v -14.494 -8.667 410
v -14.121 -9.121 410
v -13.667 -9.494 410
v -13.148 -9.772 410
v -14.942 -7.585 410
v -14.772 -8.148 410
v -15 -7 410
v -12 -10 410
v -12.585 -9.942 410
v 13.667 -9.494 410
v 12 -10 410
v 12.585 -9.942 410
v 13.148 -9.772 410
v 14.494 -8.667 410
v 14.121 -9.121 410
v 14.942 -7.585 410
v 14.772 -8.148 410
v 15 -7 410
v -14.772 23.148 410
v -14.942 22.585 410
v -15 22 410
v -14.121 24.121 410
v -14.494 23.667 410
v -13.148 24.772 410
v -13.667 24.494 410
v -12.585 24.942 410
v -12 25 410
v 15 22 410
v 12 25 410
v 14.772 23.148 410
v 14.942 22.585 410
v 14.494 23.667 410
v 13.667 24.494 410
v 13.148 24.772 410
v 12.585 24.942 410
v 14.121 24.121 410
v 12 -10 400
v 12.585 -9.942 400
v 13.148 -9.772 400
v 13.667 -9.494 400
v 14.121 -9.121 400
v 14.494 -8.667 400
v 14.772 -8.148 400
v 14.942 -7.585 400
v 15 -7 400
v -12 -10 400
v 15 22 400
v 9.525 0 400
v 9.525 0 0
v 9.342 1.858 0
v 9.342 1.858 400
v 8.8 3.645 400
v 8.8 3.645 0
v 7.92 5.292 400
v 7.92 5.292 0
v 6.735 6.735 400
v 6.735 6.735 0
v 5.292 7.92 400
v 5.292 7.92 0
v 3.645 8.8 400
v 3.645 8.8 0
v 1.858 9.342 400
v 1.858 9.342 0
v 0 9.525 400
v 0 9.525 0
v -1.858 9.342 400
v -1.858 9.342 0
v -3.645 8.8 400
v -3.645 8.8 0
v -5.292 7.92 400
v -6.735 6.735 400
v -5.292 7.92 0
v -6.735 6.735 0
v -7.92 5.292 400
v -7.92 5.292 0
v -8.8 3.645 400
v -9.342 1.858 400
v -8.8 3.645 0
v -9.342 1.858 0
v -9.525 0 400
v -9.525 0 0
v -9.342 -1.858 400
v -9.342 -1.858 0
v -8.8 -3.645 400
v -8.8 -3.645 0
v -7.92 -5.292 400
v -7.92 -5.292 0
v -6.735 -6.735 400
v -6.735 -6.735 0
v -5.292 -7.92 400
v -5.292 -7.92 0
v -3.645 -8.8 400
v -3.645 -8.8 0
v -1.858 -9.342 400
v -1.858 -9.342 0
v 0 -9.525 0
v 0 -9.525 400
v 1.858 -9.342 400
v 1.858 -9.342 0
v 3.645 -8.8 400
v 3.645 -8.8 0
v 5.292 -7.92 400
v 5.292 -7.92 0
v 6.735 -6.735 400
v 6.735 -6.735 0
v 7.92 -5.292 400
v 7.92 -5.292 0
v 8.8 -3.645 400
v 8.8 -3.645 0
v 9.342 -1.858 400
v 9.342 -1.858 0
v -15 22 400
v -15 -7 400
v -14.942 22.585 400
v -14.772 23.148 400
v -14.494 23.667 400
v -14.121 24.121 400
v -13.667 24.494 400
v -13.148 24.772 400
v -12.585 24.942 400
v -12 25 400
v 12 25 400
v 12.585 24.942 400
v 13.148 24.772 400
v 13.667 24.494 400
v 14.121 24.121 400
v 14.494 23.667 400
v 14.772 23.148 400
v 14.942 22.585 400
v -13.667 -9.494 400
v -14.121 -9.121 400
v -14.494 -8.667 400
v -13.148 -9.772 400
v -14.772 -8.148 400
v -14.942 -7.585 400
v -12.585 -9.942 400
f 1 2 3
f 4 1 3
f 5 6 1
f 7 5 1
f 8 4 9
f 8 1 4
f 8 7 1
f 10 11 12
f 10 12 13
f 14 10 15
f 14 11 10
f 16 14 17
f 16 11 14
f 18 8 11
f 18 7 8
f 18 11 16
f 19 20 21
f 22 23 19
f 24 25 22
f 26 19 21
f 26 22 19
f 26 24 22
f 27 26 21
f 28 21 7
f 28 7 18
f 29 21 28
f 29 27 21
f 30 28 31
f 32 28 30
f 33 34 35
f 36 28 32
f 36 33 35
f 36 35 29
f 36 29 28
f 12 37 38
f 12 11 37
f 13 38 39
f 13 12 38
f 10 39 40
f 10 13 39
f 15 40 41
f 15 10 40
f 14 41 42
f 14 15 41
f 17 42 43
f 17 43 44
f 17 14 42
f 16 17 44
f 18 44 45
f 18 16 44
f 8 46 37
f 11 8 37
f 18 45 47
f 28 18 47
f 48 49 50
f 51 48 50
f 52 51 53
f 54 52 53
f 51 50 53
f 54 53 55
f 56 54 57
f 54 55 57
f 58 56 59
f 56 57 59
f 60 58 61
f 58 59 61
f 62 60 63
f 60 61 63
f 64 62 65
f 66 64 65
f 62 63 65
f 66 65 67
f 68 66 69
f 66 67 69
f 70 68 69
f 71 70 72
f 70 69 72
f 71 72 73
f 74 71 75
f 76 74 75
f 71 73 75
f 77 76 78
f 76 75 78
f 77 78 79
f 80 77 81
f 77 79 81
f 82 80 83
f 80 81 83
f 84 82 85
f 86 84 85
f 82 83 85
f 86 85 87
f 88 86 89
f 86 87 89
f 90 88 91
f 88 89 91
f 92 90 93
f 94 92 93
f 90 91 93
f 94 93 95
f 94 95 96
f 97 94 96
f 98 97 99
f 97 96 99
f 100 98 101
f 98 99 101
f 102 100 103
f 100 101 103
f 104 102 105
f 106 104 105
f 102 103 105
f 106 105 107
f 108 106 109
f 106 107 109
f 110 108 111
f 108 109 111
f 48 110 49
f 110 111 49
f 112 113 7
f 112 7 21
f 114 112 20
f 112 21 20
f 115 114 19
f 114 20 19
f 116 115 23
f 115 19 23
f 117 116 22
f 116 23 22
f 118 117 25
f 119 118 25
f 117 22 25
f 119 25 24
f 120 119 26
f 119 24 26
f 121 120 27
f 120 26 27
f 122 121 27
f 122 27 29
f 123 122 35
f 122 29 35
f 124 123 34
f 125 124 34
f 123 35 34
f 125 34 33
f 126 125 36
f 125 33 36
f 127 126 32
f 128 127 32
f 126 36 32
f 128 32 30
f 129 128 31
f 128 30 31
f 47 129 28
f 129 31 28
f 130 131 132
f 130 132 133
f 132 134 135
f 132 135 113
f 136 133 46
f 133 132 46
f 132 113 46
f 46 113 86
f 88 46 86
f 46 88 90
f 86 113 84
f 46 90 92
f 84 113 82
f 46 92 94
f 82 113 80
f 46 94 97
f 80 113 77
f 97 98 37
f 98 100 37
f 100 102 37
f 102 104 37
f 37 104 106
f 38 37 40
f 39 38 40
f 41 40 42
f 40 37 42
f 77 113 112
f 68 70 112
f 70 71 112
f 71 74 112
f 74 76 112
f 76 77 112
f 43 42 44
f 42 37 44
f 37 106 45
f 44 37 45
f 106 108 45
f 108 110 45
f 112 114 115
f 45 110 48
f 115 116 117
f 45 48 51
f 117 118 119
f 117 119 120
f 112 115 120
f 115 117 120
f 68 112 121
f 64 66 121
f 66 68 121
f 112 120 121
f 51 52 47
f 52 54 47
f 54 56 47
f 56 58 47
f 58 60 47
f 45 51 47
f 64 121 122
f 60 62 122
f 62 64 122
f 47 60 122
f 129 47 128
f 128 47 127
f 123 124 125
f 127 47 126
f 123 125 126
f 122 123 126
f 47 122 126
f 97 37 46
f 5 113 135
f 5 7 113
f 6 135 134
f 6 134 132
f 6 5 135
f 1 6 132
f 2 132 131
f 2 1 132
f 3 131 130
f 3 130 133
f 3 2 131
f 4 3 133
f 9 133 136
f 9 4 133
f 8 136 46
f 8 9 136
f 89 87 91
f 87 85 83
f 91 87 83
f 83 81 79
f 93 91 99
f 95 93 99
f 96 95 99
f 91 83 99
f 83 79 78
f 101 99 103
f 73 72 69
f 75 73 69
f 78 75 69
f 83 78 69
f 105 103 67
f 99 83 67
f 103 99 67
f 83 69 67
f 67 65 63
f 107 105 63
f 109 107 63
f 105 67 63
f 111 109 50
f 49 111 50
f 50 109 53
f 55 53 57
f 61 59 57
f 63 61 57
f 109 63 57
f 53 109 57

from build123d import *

# Parameters (mm, degrees)
SKETCH1_R           = 9.525
BOSS_EXTRUDE1_DEPTH = 400
SKETCH2_W           = 30
SKETCH2_H           = 35
BOSS_EXTRUDE2_DEPTH = 10
FILLET1_R           = 3


with BuildPart() as part:
    # Sketch1 → Boss-Extrude1 (new body)
    with BuildSketch(Plane.XY):
        Circle(SKETCH1_R)
    extrude(amount=BOSS_EXTRUDE1_DEPTH)

    # Sketch2 → Boss-Extrude2 (add)
    with BuildSketch(Plane.XY.offset(400)):
        with Locations((0, 7.5)):
            Rectangle(SKETCH2_W, SKETCH2_H)
    extrude(amount=BOSS_EXTRUDE2_DEPTH)

    # Fillet1
    fillet1_edges = [part.edges().sort_by_distance(p)[0] for p in [
        (-15, 25, 405),
        (-15, -10, 405),
        (15, -10, 405),
        (15, 25, 405),
    ]]
    fillet(fillet1_edges, radius=FILLET1_R)


solid = part.part
